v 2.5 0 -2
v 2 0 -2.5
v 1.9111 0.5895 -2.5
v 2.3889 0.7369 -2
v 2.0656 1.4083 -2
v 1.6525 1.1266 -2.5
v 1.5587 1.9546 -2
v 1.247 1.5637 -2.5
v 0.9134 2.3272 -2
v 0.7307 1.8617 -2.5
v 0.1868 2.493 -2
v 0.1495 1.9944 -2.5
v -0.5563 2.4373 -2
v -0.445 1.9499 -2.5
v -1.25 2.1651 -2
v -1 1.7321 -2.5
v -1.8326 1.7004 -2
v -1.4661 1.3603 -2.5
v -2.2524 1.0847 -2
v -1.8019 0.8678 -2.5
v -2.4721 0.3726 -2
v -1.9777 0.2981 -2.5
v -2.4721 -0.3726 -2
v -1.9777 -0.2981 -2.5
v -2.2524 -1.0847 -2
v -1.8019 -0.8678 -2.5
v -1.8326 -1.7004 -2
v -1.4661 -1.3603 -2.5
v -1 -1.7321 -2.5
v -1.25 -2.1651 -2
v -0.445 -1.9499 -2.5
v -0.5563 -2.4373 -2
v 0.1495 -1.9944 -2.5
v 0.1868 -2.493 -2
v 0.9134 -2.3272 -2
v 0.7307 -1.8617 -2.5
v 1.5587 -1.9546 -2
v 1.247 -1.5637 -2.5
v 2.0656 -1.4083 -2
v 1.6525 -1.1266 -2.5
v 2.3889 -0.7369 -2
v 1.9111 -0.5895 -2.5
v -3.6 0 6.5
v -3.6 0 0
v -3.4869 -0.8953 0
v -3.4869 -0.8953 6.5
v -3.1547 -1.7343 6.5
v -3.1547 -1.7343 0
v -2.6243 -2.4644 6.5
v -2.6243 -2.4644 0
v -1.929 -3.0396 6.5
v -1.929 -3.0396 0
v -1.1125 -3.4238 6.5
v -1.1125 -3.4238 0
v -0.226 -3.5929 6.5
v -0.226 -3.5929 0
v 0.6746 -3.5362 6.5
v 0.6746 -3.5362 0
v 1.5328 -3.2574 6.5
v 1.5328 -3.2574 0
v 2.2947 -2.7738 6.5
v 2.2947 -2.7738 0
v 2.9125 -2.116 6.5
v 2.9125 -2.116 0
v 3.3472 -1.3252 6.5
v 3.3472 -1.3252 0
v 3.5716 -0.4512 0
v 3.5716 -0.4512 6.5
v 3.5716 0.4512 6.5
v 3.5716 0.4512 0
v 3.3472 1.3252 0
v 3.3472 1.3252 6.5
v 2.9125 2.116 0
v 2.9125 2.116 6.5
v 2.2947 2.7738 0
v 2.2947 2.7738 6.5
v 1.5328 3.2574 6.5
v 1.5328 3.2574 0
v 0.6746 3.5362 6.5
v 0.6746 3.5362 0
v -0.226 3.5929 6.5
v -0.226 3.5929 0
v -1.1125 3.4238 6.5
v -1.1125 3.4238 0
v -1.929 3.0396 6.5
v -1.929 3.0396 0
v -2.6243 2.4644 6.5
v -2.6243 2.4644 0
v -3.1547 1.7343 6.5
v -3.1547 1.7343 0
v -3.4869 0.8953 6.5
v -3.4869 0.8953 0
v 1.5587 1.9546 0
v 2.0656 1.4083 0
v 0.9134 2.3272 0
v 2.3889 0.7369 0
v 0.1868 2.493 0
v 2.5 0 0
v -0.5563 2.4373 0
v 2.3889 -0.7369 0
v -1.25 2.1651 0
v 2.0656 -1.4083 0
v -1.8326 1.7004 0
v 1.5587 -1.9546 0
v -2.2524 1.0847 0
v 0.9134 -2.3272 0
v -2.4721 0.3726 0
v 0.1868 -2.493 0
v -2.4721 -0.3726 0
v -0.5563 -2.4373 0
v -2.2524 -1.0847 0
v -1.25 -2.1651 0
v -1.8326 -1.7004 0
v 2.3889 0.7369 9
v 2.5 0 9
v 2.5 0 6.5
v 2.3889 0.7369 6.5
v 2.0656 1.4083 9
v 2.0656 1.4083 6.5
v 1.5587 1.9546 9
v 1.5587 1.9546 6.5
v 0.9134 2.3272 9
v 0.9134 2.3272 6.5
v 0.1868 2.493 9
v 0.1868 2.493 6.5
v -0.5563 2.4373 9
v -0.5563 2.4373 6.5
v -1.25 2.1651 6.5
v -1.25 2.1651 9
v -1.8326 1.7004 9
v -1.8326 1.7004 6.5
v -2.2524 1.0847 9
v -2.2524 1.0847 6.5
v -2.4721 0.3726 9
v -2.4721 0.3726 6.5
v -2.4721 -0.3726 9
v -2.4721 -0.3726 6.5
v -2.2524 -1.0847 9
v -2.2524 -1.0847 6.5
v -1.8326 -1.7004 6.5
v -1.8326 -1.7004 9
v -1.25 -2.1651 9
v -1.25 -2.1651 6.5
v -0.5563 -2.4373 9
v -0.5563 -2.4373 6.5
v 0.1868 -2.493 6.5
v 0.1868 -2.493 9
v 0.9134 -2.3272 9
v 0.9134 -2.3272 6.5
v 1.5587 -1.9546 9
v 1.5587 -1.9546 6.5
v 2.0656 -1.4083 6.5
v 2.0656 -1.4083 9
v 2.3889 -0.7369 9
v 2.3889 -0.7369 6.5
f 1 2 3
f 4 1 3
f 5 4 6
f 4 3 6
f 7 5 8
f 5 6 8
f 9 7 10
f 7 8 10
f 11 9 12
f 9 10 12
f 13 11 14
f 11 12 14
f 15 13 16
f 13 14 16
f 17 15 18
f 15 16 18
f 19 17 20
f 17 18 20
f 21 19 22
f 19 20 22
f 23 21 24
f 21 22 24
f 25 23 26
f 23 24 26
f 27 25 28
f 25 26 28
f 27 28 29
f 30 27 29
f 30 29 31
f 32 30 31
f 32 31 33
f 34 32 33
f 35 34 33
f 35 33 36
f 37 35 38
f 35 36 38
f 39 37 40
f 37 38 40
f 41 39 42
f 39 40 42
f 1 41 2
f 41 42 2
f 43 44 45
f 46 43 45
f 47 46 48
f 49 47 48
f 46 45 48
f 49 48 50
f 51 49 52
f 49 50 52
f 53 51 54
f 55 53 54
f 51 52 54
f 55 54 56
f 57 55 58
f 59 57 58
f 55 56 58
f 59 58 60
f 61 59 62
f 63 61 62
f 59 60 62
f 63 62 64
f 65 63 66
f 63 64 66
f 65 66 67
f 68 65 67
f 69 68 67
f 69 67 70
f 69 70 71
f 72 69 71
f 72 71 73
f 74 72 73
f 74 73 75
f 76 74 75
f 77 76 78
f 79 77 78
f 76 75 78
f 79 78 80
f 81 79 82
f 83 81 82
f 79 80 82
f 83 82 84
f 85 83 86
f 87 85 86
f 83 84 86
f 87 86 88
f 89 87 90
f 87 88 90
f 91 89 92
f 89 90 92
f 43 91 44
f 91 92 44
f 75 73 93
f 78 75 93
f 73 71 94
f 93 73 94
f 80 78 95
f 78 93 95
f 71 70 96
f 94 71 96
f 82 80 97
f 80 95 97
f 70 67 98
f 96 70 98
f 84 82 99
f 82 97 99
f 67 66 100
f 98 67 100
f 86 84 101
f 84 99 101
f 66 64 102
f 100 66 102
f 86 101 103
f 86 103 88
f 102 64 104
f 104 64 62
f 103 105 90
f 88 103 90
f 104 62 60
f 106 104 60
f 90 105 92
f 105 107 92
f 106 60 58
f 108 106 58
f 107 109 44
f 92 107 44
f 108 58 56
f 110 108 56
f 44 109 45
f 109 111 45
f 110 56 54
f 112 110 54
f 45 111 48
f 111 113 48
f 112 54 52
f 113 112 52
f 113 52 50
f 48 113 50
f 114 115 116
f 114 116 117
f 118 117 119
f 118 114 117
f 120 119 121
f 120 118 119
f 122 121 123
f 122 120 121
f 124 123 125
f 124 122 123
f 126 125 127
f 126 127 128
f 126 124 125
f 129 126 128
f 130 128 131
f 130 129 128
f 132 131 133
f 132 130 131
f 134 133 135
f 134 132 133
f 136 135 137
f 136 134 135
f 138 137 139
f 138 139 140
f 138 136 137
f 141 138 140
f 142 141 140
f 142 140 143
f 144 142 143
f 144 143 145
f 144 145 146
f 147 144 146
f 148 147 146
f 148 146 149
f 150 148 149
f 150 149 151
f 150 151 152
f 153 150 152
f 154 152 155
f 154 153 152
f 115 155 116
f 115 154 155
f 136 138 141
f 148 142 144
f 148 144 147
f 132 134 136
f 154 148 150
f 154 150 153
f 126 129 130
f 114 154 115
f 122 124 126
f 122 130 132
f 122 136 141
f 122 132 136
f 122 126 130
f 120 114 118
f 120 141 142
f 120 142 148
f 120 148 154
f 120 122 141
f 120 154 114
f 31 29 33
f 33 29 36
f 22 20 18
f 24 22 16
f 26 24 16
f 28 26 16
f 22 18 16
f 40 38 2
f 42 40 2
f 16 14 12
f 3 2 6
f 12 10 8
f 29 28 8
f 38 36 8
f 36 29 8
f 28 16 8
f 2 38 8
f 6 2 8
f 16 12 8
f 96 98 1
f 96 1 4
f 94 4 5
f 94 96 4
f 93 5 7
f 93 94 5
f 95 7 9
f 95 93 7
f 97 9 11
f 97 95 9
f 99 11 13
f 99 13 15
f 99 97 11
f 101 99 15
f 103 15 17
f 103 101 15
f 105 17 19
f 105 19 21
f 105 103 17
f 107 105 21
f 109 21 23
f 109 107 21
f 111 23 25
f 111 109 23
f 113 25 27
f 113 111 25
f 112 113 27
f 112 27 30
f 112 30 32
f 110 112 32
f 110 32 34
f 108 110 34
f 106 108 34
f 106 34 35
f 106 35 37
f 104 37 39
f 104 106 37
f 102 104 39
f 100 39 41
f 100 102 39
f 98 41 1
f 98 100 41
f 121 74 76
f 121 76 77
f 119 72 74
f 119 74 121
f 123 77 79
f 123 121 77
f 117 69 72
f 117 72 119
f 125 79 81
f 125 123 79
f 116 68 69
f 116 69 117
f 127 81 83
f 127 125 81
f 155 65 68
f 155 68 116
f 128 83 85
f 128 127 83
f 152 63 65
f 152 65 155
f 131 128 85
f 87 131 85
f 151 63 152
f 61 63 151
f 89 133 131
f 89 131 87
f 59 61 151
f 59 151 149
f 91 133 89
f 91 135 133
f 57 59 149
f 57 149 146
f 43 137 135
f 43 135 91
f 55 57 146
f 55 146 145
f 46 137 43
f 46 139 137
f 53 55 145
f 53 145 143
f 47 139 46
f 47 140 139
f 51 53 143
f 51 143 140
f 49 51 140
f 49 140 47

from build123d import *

# Parameters (mm, degrees)
SKETCH3_R           = 3.6
BOSS_EXTRUDE1_DEPTH = 6.5
SKETCH4_R           = 2.5
BOSS_EXTRUDE2_DEPTH = 2.5
BOSS_EXTRUDE3_START = 2.5
SKETCH5_R           = 2.5
BOSS_EXTRUDE3_DEPTH = 2.5
CHAMFER1_SIZE       = 0.5


with BuildPart() as part:
    # Sketch3 → Boss-Extrude1 (new body)
    with BuildSketch(Plane.XY):
        with Locations(Location((0, 0, 0), (0, 0, 180))):
            Circle(SKETCH3_R)
    extrude(amount=BOSS_EXTRUDE1_DEPTH)

    # Sketch4 → Boss-Extrude2 (add)
    with BuildSketch(Plane.XY):
        Circle(SKETCH4_R)
    extrude(amount=-BOSS_EXTRUDE2_DEPTH)

    # Sketch5 → Boss-Extrude3 (add)
    with BuildSketch(Plane.XY.offset(6.5).offset(BOSS_EXTRUDE3_START)):
        Circle(SKETCH5_R)
    extrude(amount=-BOSS_EXTRUDE3_DEPTH)

    # Chamfer1
    chamfer1_edges = [part.edges().sort_by_distance(p)[0] for p in [
        (-2.5, 0, -2.5),
    ]]
    chamfer(chamfer1_edges, length=CHAMFER1_SIZE)


solid = part.part
